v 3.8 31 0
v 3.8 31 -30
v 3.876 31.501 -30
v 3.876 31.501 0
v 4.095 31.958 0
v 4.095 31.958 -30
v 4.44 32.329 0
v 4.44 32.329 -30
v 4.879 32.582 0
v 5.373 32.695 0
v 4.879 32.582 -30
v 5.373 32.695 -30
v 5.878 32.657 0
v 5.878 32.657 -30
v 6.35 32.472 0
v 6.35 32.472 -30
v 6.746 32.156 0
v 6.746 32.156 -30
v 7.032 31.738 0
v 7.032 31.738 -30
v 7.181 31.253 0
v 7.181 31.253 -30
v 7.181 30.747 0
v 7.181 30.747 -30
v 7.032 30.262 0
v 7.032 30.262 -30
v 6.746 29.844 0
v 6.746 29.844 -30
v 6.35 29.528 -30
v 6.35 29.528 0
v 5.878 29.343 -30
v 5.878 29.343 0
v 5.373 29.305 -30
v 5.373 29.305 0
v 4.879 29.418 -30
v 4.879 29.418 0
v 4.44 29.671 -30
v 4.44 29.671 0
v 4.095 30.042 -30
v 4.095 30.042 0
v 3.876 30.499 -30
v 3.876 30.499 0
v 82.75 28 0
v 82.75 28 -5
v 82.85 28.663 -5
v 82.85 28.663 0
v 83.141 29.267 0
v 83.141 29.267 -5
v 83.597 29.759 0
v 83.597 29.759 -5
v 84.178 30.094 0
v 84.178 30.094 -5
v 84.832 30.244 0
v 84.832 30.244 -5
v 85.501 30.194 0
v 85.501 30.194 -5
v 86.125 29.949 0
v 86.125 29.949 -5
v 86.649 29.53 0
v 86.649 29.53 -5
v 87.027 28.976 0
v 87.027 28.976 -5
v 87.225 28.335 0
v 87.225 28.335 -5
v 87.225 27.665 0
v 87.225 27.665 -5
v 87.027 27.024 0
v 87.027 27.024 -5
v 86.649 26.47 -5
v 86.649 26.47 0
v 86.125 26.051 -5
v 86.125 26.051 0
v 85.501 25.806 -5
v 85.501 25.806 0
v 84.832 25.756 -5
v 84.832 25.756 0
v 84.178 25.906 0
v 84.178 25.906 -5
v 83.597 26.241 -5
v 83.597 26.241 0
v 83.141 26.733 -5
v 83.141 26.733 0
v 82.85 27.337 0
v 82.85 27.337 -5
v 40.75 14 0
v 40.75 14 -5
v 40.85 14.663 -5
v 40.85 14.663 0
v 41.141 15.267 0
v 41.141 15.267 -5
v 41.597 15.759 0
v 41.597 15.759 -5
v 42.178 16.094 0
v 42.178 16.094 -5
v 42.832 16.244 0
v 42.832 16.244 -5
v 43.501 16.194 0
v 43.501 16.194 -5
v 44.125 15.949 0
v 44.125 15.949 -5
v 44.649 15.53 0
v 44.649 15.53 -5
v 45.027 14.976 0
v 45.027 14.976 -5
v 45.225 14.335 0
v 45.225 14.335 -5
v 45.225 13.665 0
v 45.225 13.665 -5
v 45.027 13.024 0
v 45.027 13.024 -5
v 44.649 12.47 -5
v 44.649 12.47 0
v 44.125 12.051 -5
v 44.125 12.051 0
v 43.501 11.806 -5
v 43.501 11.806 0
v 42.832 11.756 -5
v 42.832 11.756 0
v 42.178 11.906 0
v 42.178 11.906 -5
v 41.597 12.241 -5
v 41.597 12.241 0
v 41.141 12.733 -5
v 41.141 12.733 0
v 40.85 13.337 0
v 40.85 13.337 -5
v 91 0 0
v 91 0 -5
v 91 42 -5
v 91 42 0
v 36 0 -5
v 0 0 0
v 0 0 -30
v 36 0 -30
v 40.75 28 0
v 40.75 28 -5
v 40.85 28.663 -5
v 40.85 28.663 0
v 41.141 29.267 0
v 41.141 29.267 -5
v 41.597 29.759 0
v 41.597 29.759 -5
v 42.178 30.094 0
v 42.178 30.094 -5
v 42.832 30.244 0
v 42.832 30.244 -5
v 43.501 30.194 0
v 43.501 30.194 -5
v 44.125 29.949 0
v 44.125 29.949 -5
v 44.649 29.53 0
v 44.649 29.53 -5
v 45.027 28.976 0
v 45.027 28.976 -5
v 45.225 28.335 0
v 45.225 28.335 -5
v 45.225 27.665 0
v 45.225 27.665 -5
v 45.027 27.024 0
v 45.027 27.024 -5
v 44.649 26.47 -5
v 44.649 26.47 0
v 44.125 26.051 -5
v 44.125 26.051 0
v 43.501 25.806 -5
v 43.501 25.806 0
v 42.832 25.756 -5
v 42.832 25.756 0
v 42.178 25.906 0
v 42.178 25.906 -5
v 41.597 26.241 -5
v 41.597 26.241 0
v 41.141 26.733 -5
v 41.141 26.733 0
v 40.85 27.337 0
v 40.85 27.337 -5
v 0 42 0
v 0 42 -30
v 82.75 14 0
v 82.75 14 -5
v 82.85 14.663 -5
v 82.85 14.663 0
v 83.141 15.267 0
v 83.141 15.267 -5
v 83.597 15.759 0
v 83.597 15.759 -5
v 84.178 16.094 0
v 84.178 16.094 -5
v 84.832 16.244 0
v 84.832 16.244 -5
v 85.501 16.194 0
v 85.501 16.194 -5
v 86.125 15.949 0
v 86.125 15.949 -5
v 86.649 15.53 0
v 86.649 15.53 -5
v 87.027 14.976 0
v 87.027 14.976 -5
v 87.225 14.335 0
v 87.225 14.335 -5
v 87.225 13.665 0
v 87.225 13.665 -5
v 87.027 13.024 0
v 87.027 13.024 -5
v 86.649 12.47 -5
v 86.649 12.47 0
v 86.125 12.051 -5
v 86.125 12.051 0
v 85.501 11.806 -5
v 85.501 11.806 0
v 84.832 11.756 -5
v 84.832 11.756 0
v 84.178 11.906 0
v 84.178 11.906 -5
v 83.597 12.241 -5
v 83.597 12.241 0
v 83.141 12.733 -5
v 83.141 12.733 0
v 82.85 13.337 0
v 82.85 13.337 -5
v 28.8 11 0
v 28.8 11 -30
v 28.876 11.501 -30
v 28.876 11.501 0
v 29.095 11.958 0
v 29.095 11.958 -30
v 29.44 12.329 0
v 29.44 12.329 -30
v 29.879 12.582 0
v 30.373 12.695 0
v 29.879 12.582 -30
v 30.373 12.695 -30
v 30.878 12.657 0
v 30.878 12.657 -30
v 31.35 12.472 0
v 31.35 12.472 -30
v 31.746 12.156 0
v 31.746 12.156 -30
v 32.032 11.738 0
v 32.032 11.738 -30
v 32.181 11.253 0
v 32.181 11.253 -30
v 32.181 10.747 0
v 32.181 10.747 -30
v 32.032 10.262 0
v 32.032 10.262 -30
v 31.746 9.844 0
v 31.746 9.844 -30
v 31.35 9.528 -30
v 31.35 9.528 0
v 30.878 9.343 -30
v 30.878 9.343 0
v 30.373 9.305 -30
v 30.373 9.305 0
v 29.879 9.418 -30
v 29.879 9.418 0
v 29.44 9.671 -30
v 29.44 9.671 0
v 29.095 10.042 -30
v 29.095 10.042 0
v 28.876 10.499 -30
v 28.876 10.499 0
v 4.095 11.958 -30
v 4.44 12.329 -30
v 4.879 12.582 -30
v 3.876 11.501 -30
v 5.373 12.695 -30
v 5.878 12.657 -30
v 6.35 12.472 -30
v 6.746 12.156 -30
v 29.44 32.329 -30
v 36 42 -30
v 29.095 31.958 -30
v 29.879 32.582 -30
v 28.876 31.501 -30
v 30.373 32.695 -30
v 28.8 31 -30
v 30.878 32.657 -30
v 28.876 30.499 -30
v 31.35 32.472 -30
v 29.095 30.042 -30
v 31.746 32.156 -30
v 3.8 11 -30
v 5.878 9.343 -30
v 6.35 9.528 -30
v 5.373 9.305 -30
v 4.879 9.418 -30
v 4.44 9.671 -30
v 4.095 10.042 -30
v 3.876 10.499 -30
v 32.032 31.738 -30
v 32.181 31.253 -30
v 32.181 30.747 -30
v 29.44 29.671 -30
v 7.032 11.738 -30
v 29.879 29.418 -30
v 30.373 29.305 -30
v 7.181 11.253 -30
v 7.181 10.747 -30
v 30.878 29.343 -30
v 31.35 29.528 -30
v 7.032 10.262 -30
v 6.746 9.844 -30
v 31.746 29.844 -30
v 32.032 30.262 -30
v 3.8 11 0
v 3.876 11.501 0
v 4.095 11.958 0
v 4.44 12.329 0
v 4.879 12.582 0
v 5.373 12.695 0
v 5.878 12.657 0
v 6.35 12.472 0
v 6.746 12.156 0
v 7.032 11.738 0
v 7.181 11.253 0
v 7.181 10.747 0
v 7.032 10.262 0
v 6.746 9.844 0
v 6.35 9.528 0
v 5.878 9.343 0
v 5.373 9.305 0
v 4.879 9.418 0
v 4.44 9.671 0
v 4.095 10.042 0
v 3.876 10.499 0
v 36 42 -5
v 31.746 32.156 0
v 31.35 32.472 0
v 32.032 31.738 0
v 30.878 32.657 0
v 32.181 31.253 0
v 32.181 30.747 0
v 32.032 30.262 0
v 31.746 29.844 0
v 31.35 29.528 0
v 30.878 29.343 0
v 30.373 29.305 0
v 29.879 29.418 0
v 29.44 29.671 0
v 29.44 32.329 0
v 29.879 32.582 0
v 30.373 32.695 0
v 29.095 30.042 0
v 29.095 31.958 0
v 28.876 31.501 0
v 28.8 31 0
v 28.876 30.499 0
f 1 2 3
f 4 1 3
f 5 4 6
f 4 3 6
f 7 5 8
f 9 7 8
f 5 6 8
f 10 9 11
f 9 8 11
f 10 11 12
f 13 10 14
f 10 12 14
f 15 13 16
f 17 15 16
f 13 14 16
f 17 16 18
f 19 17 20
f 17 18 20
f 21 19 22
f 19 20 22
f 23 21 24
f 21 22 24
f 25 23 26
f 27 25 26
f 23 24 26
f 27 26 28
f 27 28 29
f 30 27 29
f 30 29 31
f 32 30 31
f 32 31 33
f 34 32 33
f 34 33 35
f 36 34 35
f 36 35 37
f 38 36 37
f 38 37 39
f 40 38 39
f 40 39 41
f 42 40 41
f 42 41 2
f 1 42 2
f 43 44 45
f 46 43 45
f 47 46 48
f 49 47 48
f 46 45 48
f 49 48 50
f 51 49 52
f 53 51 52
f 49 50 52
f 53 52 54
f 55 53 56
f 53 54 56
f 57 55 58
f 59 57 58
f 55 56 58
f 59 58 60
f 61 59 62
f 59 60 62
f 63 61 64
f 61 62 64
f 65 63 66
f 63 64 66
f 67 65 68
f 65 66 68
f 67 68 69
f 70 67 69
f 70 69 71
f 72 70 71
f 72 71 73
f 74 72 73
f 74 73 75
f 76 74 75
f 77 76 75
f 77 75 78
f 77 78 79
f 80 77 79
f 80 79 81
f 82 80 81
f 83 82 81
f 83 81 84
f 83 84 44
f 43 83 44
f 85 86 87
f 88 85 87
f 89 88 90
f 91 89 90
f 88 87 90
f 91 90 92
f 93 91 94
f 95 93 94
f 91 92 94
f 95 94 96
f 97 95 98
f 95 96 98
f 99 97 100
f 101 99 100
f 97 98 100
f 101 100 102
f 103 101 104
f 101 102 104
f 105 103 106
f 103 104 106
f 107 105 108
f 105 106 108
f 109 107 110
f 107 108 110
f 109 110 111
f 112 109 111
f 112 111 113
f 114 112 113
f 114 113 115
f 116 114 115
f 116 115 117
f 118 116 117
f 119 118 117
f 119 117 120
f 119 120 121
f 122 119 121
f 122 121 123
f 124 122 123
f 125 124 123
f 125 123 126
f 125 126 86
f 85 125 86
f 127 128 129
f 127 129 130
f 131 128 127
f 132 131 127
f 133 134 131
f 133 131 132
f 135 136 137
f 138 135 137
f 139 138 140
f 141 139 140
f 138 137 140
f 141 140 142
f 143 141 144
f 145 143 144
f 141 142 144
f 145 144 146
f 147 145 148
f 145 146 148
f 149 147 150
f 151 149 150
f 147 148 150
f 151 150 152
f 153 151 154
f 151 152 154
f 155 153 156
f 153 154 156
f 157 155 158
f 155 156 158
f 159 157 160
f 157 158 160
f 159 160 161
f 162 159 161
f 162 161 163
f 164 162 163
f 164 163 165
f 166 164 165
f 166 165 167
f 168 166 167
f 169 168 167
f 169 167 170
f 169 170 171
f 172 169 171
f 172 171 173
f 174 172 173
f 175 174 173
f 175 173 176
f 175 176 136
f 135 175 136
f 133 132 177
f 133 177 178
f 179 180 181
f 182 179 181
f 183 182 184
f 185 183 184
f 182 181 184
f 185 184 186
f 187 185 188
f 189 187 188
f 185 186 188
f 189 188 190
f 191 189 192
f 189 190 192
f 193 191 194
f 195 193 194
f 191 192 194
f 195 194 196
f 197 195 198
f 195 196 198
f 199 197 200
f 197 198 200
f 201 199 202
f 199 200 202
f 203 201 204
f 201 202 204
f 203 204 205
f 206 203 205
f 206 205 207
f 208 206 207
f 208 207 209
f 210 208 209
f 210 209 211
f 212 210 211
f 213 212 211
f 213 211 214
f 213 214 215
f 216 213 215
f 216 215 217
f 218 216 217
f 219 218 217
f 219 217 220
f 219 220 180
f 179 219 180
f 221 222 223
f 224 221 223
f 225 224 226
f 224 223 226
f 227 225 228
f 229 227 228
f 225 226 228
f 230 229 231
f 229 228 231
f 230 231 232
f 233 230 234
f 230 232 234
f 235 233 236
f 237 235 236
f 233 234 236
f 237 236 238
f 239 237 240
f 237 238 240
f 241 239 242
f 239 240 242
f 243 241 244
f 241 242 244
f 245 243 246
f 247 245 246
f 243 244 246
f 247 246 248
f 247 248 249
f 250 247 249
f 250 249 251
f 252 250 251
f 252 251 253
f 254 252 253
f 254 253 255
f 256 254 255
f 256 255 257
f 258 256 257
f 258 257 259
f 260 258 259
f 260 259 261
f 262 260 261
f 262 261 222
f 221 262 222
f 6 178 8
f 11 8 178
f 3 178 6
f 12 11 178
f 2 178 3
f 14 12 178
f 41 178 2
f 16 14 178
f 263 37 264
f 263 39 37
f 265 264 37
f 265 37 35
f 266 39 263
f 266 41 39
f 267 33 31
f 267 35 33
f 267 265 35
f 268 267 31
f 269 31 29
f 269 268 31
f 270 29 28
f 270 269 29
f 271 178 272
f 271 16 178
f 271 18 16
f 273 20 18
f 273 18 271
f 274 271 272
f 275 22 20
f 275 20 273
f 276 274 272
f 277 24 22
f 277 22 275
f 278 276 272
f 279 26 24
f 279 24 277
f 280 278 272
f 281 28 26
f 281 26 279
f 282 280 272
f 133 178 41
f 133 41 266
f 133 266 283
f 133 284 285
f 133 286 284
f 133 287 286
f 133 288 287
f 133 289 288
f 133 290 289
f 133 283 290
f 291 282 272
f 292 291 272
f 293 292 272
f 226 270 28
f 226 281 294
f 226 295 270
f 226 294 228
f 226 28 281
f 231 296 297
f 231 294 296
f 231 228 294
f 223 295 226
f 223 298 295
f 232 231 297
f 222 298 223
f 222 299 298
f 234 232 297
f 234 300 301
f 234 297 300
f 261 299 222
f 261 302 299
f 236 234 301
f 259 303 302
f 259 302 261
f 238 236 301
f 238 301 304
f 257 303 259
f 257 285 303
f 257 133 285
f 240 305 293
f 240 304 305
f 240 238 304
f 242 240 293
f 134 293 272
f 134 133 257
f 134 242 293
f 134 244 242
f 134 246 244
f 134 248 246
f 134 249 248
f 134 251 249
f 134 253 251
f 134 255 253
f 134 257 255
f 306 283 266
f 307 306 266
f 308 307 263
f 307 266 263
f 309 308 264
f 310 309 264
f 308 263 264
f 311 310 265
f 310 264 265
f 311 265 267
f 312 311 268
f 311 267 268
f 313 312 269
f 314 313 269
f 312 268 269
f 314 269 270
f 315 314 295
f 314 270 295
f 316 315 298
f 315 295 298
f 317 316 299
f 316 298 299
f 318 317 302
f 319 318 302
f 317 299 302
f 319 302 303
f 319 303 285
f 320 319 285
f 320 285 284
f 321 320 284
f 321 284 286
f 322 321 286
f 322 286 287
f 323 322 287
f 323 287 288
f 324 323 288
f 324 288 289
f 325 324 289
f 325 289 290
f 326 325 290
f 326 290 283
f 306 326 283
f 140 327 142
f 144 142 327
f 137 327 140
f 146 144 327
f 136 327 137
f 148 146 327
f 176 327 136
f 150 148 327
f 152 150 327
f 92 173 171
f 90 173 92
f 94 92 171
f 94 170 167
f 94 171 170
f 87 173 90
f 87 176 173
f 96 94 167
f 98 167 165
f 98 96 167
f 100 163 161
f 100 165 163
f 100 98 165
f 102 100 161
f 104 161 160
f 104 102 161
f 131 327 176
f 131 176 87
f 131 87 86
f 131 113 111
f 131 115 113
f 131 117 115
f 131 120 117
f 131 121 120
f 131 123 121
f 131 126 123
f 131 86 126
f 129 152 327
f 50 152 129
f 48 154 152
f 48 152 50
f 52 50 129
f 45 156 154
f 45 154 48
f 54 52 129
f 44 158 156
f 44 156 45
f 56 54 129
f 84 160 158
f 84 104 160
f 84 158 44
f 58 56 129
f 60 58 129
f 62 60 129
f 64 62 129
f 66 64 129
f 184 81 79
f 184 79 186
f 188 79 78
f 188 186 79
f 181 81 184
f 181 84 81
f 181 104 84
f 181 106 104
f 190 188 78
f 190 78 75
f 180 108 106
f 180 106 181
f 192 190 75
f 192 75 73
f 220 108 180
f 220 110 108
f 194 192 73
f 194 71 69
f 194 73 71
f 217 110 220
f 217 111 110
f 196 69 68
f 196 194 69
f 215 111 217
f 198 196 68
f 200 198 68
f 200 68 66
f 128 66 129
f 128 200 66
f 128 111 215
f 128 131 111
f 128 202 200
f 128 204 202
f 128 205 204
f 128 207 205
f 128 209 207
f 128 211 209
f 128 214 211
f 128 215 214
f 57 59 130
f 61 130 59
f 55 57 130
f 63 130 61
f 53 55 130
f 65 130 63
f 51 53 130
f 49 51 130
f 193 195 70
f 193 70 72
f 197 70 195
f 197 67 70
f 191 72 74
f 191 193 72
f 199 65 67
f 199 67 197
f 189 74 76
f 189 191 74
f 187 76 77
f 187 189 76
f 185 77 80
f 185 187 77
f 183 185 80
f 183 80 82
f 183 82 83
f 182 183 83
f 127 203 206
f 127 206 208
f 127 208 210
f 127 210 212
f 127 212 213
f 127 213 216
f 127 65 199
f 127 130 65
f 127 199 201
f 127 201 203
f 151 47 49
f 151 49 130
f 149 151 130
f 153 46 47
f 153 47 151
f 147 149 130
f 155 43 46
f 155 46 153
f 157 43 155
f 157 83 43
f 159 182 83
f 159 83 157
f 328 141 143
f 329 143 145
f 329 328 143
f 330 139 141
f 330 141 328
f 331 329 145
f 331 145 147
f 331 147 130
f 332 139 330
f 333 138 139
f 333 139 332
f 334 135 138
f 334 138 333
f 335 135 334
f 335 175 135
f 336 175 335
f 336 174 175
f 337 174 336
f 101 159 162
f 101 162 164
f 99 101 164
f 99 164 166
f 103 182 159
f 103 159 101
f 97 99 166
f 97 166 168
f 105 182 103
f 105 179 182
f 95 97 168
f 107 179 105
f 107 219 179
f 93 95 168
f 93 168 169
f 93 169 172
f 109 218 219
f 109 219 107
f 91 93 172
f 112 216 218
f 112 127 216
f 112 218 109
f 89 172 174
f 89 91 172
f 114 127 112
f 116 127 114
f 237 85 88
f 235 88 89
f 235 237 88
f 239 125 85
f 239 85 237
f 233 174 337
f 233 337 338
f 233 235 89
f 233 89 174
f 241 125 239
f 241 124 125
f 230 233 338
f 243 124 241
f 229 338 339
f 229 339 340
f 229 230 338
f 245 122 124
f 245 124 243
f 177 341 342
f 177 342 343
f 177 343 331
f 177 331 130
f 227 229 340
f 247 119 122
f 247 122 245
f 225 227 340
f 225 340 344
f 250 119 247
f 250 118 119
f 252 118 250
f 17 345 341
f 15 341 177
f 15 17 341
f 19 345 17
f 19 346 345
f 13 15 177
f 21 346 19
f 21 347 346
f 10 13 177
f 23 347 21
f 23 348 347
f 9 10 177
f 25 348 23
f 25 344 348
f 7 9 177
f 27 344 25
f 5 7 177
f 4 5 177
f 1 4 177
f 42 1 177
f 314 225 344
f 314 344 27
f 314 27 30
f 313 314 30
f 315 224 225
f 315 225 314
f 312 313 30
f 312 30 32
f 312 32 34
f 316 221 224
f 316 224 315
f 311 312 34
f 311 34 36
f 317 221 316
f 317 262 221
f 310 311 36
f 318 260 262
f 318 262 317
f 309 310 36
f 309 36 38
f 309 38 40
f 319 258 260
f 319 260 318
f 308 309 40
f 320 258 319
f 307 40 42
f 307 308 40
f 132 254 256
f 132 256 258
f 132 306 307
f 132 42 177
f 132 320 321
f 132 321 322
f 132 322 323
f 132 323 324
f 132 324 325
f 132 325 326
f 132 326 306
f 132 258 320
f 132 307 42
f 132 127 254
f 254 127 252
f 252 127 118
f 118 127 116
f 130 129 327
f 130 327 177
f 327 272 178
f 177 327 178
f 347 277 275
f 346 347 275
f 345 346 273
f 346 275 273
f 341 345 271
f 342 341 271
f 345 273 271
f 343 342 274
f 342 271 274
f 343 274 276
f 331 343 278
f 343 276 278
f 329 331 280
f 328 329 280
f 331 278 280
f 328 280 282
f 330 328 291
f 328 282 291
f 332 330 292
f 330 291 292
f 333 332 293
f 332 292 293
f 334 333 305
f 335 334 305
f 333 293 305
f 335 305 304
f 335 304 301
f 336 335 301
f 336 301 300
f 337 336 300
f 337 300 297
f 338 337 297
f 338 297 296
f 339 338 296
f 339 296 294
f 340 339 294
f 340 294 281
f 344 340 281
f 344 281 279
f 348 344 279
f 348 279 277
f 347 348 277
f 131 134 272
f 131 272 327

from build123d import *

# Parameters (mm, degrees)
EXTRUDE_1_DEPTH    = 42
HOLE_WIZARD_M4_1_D = 4.5
HOLE_WIZARD_M3_1_D = 3.4


with BuildPart() as part:
    # 스케치1 → 보스-돌출1 (new body)
    with BuildSketch(Plane(origin=(0, 0, 0), x_dir=(1, 0, 0), z_dir=(0, 1, 0))):
        Polygon((0, 0), (0, 30), (36, 30), (36, 5), (91, 5), (91, 0), align=None)
    extrude(amount=EXTRUDE_1_DEPTH)

    # M4 여유 구멍1 (through all)
    with Locations(Plane.XY):
        with Locations((85, 28), (85, 14), (43, 28), (43, 14)):
            Hole(HOLE_WIZARD_M4_1_D / 2)

    # M3 여유 구멍1 (through all)
    with Locations(Plane.XY):
        with Locations((5.5, 31), (5.5, 11), (30.5, 31), (30.5, 11)):
            Hole(HOLE_WIZARD_M3_1_D / 2)


solid = part.part
